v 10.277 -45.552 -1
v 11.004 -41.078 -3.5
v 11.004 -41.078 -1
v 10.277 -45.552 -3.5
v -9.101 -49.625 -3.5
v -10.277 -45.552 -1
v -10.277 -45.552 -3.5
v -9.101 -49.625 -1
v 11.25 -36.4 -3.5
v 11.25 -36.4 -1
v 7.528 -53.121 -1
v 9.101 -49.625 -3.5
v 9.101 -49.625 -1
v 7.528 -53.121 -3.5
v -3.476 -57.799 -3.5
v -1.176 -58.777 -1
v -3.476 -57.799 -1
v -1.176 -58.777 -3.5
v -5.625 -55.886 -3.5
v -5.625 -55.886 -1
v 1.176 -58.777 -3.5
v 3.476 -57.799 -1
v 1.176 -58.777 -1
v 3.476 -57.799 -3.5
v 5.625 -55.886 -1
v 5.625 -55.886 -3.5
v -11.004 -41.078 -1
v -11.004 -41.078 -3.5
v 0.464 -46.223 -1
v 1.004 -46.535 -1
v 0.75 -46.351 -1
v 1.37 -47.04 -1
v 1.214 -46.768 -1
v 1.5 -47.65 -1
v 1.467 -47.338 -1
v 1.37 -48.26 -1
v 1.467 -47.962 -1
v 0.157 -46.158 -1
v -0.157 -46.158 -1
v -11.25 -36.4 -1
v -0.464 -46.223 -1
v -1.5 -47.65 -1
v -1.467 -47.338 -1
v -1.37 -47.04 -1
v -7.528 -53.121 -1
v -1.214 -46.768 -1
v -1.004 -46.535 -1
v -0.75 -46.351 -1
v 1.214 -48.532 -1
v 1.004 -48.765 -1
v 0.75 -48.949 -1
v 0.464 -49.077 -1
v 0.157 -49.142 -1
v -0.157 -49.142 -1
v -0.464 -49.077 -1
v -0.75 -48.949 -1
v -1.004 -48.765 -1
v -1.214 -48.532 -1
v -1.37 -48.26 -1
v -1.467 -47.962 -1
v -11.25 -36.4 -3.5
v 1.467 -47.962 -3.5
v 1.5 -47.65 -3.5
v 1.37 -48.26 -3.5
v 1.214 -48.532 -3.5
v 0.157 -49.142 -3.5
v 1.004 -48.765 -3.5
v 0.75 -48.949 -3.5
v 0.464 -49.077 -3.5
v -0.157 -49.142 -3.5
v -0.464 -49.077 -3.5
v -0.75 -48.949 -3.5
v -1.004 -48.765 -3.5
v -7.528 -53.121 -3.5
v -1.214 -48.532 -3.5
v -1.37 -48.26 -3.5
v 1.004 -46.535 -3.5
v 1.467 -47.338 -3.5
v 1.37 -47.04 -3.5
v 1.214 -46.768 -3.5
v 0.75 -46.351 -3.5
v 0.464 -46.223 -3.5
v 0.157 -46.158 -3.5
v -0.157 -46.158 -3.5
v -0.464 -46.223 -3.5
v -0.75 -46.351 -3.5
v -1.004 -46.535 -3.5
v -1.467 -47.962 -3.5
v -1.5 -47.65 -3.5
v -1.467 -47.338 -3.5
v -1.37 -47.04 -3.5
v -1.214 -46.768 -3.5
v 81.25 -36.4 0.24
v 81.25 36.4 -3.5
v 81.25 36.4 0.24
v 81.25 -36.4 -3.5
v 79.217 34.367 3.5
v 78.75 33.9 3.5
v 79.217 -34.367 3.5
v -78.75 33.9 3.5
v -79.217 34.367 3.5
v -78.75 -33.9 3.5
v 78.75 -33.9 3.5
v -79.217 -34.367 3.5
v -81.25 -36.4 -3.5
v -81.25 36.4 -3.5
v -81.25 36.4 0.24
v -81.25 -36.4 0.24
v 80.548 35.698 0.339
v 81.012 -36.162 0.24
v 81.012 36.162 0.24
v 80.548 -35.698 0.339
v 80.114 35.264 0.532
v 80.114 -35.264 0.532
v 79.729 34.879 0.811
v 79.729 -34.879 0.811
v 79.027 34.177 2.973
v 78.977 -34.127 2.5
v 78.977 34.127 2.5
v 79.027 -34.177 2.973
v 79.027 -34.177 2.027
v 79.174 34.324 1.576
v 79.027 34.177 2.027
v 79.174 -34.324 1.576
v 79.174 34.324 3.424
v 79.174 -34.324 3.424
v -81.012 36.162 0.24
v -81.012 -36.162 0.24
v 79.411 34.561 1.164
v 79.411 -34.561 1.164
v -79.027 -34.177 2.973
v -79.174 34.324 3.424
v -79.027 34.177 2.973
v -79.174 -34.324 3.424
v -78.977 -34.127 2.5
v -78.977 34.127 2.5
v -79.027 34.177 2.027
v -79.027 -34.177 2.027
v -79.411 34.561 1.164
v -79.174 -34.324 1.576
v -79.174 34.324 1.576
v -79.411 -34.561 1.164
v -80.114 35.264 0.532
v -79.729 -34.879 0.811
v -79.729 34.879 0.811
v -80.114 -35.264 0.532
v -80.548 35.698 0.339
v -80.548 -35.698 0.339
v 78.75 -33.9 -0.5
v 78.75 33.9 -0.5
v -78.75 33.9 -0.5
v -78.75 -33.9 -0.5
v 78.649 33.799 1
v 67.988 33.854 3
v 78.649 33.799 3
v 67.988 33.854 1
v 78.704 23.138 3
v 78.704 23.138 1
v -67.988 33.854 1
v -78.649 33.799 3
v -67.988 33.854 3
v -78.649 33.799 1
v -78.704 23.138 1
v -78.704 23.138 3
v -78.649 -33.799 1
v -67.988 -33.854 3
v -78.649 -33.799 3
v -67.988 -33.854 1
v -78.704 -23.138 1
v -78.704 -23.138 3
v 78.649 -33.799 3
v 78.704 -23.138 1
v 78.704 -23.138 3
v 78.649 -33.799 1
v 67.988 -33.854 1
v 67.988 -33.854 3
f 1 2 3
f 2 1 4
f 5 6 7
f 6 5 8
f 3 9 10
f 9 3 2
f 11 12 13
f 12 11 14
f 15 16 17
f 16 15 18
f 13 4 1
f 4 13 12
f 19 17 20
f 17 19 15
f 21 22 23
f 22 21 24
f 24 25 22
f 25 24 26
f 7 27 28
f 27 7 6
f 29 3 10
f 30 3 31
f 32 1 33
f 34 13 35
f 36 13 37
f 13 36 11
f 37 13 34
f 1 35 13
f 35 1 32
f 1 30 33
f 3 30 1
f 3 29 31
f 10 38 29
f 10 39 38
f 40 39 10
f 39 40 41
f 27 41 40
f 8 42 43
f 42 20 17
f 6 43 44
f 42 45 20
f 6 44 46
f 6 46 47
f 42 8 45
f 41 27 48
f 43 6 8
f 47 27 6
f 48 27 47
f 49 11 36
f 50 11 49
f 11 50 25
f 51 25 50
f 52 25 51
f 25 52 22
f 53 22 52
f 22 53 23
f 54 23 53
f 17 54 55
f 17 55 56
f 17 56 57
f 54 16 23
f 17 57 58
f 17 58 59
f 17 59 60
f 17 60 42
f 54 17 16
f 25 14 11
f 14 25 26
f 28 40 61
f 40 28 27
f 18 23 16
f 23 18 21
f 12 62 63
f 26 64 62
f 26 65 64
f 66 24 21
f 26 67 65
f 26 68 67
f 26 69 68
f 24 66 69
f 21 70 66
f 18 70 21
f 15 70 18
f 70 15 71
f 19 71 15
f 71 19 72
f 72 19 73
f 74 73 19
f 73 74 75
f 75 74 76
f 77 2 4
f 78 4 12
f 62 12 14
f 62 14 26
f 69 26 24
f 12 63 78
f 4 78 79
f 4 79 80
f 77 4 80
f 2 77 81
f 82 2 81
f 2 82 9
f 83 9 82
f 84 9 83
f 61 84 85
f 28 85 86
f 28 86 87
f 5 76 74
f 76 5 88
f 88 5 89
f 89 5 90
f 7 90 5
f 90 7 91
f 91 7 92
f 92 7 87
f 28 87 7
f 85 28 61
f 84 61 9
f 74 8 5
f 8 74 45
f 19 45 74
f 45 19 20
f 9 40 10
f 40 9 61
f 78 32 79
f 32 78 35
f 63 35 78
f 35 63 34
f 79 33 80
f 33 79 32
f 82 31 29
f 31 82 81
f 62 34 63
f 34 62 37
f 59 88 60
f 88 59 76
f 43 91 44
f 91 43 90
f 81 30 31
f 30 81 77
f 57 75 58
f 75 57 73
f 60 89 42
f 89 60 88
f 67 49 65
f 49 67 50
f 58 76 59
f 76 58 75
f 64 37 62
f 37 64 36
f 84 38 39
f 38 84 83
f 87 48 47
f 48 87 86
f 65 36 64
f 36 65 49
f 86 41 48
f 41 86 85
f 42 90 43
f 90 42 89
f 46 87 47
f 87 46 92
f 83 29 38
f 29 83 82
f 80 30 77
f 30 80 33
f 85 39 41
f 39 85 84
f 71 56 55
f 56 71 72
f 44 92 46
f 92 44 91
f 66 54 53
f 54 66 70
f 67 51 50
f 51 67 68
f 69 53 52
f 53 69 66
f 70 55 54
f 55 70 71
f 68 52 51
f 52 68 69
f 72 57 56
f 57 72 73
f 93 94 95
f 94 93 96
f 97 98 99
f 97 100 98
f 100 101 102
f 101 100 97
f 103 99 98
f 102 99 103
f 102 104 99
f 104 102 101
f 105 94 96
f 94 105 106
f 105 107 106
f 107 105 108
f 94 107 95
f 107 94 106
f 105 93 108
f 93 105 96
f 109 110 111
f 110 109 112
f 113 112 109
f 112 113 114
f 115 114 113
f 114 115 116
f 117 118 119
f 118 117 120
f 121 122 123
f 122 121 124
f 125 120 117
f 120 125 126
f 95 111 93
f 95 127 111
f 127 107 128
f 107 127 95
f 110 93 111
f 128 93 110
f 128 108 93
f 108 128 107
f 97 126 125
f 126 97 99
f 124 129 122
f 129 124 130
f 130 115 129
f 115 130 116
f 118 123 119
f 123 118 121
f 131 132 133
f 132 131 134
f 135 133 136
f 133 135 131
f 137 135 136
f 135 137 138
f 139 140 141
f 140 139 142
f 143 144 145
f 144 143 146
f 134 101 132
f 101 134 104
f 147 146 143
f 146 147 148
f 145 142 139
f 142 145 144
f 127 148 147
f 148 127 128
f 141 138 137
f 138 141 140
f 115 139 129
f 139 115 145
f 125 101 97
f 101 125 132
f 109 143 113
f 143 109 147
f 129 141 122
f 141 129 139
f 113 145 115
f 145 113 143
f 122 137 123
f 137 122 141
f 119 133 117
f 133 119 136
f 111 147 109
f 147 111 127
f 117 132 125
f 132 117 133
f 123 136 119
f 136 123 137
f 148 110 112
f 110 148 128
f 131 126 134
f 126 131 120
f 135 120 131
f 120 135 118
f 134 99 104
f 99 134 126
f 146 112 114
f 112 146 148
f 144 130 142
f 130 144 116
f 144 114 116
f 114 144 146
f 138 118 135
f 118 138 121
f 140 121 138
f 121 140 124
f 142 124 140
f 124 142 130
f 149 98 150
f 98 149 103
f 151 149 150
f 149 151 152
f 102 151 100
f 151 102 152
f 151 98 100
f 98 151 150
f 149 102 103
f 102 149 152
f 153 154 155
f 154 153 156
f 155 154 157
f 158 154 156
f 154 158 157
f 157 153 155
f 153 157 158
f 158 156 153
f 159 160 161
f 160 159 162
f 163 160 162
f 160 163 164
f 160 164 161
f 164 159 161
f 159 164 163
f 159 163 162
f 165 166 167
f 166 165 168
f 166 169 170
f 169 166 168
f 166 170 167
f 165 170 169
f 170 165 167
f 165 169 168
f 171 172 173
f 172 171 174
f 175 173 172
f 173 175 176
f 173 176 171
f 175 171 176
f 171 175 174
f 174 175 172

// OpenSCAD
//------------------Variables------------------\\ 

		//----Global Values----\\
			//The default unit in OpenSCAD is mm and this unit variable allows one to change the variables in the code with units other than mm. Default is 1, for mm, but cm is 10 and inches is 25.4. Note that this entails that you change EVERY variable (except maybe sfn)  so that one piece of the model is not ridiculously bigger/smaller than the other parts. 
				unit=1;

			//The detail in the cylinders/spheres of the shape.
				sfn=30;

		//----Bill Specifics----\\

			//The length of the bill.
				billength= 157.5;

			//The width of the bill. 
				billwidth = 67.8;

			//The thickness of the frame. 
				framethick = 5;
			
			//Bottom Thickness
				botthick = 2 ;

		//----Frame Specifics----\\

			//The border of the frame length-wise. This is the measurement from the inside of the frame to the outisde on the length (x) axis. The cylinders that shape the frame use this measurement.
				xframe = 5;

			//The border of the frame width-wise. This is the measurement from the inside of the frame to the outisde on the width (y) axis.
				yframe = 5;
		
			//How prominent the frame shaping is. Play with this value. Default is 2.
				frameshapethick = 1.1;

			//How raised the frame shaping is. Play with this value as well. 
				frameshaperaise = 0;


	//----Bill holder----\\
	billholdx=5;
	billholdz=2;
	billholdlift=1;
	
	//----Hook sizing----\\
		//Hook size
		hooksize=22.5;

		//Hook hole size
		hookhole=3;

		//Hook thickness
		hookthick=2.5;

//-------------------Modules-------------------\\ 

	//----Basic Frame Shapes----\\
		module bill() {
			cube([billength*unit, billwidth*unit,framethick*unit], center=true);
		}

		module outsideframe() { 
			cube([(billength+xframe)*unit, (billwidth+yframe)*unit, (framethick+botthick)*unit], center=true);
		}

	//----Frame shaping.----\\
		//Frame shaping cylinder on the X Axis.
			module xfsc() {
				cylinder(r=(framethick*unit)/(frameshapethick*2), h=(billwidth+yframe)*unit+xframe, center=true, $fn=sfn);
			}

		//Frame shaping cylinder on the Y Axis.
			module yfsc() {
				cylinder(r=(framethick*unit)/(frameshapethick*2), h=(billength+xframe)*unit+yframe, center=true, $fn=sfn);
			}

		//Frameshaping general module
			module frameshaping() {
				translate([(billength/2)*unit+xframe/2, 0, (framethick/2)*unit]) {
					rotate([90,0,0]) {
						xfsc();
					}
				}
				translate([(-billength/2)*unit-xframe/2, 0, (framethick/2)*unit]) {
					rotate([90,0,0]) {
						xfsc();
					}
				}

				translate([0, (billwidth/2)*unit+yframe/2, (framethick/2)*unit]) {
					rotate([90,0,90]) {
						yfsc();
					}
				}
				translate([0, (-billwidth/2)*unit-yframe/2, (framethick/2)*unit]) {
					rotate([90,0,90]) {
						yfsc();
					}
				}
			}

	






module billhold(){
	translate([billength/2-billholdx/1.375, billwidth/2-billholdx/1.375, billholdlift]) {
		rotate([0,0,45]) {
			scale([1,1.75,1]){
				cylinder($fn=3, r=billholdx, h=billholdz);
			}
		}
	}

	translate([-billength/2+billholdx/1.375, billwidth/2-billholdx/1.375, billholdlift]) {
		rotate([0,0,135]) {
			scale([1,1.75,1]){
				cylinder($fn=3, r=billholdx, h=billholdz);
			}
		}
	}
	translate([-billength/2+billholdx/1.375, -billwidth/2+billholdx/1.375, billholdlift]) {
		rotate([0,0,225]) {
			scale([1,1.75,1]){
				cylinder($fn=3, r=billholdx, h=billholdz);
			}
		}
	}

	translate([billength/2-billholdx/1.375, -billwidth/2+billholdx/1.375, billholdlift]) {
		rotate([0,0,315]) {
			scale([1,1.75,1]){
				cylinder($fn=3, r=billholdx, h=billholdz);
			}
		}
	}





}
		
	module hook() {
		translate([0,-((billwidth+xframe)/2)*unit, (-(framethick+botthick)/2)*unit ]) {
			difference() {
				scale([1,2,1]) {
					cylinder(r=(hooksize/2)*unit, h=hookthick*unit, $fn=sfn);
				}
				translate([(-hooksize/2)*unit, 0]) {
					cube([hooksize*unit, hooksize*unit, hookthick*unit]);
				}
				translate([0, (-hooksize/2)*unit, 0]) {
					cylinder(r=(hookhole/2)*unit, h=hookthick*unit, $fn=sfn);
				}
			}
		}
	}


	//Plating module
	module frame1() {
		difference() {
			union(){
				outsideframe();
				hook();
			}
			translate([0,0, botthick]) {
				bill();
			}
			translate([0,0, frameshaperaise]) {
				frameshaping();
			}
			
		}
	}

	module frame(){
	frame1();
	billhold();
}

frame();
